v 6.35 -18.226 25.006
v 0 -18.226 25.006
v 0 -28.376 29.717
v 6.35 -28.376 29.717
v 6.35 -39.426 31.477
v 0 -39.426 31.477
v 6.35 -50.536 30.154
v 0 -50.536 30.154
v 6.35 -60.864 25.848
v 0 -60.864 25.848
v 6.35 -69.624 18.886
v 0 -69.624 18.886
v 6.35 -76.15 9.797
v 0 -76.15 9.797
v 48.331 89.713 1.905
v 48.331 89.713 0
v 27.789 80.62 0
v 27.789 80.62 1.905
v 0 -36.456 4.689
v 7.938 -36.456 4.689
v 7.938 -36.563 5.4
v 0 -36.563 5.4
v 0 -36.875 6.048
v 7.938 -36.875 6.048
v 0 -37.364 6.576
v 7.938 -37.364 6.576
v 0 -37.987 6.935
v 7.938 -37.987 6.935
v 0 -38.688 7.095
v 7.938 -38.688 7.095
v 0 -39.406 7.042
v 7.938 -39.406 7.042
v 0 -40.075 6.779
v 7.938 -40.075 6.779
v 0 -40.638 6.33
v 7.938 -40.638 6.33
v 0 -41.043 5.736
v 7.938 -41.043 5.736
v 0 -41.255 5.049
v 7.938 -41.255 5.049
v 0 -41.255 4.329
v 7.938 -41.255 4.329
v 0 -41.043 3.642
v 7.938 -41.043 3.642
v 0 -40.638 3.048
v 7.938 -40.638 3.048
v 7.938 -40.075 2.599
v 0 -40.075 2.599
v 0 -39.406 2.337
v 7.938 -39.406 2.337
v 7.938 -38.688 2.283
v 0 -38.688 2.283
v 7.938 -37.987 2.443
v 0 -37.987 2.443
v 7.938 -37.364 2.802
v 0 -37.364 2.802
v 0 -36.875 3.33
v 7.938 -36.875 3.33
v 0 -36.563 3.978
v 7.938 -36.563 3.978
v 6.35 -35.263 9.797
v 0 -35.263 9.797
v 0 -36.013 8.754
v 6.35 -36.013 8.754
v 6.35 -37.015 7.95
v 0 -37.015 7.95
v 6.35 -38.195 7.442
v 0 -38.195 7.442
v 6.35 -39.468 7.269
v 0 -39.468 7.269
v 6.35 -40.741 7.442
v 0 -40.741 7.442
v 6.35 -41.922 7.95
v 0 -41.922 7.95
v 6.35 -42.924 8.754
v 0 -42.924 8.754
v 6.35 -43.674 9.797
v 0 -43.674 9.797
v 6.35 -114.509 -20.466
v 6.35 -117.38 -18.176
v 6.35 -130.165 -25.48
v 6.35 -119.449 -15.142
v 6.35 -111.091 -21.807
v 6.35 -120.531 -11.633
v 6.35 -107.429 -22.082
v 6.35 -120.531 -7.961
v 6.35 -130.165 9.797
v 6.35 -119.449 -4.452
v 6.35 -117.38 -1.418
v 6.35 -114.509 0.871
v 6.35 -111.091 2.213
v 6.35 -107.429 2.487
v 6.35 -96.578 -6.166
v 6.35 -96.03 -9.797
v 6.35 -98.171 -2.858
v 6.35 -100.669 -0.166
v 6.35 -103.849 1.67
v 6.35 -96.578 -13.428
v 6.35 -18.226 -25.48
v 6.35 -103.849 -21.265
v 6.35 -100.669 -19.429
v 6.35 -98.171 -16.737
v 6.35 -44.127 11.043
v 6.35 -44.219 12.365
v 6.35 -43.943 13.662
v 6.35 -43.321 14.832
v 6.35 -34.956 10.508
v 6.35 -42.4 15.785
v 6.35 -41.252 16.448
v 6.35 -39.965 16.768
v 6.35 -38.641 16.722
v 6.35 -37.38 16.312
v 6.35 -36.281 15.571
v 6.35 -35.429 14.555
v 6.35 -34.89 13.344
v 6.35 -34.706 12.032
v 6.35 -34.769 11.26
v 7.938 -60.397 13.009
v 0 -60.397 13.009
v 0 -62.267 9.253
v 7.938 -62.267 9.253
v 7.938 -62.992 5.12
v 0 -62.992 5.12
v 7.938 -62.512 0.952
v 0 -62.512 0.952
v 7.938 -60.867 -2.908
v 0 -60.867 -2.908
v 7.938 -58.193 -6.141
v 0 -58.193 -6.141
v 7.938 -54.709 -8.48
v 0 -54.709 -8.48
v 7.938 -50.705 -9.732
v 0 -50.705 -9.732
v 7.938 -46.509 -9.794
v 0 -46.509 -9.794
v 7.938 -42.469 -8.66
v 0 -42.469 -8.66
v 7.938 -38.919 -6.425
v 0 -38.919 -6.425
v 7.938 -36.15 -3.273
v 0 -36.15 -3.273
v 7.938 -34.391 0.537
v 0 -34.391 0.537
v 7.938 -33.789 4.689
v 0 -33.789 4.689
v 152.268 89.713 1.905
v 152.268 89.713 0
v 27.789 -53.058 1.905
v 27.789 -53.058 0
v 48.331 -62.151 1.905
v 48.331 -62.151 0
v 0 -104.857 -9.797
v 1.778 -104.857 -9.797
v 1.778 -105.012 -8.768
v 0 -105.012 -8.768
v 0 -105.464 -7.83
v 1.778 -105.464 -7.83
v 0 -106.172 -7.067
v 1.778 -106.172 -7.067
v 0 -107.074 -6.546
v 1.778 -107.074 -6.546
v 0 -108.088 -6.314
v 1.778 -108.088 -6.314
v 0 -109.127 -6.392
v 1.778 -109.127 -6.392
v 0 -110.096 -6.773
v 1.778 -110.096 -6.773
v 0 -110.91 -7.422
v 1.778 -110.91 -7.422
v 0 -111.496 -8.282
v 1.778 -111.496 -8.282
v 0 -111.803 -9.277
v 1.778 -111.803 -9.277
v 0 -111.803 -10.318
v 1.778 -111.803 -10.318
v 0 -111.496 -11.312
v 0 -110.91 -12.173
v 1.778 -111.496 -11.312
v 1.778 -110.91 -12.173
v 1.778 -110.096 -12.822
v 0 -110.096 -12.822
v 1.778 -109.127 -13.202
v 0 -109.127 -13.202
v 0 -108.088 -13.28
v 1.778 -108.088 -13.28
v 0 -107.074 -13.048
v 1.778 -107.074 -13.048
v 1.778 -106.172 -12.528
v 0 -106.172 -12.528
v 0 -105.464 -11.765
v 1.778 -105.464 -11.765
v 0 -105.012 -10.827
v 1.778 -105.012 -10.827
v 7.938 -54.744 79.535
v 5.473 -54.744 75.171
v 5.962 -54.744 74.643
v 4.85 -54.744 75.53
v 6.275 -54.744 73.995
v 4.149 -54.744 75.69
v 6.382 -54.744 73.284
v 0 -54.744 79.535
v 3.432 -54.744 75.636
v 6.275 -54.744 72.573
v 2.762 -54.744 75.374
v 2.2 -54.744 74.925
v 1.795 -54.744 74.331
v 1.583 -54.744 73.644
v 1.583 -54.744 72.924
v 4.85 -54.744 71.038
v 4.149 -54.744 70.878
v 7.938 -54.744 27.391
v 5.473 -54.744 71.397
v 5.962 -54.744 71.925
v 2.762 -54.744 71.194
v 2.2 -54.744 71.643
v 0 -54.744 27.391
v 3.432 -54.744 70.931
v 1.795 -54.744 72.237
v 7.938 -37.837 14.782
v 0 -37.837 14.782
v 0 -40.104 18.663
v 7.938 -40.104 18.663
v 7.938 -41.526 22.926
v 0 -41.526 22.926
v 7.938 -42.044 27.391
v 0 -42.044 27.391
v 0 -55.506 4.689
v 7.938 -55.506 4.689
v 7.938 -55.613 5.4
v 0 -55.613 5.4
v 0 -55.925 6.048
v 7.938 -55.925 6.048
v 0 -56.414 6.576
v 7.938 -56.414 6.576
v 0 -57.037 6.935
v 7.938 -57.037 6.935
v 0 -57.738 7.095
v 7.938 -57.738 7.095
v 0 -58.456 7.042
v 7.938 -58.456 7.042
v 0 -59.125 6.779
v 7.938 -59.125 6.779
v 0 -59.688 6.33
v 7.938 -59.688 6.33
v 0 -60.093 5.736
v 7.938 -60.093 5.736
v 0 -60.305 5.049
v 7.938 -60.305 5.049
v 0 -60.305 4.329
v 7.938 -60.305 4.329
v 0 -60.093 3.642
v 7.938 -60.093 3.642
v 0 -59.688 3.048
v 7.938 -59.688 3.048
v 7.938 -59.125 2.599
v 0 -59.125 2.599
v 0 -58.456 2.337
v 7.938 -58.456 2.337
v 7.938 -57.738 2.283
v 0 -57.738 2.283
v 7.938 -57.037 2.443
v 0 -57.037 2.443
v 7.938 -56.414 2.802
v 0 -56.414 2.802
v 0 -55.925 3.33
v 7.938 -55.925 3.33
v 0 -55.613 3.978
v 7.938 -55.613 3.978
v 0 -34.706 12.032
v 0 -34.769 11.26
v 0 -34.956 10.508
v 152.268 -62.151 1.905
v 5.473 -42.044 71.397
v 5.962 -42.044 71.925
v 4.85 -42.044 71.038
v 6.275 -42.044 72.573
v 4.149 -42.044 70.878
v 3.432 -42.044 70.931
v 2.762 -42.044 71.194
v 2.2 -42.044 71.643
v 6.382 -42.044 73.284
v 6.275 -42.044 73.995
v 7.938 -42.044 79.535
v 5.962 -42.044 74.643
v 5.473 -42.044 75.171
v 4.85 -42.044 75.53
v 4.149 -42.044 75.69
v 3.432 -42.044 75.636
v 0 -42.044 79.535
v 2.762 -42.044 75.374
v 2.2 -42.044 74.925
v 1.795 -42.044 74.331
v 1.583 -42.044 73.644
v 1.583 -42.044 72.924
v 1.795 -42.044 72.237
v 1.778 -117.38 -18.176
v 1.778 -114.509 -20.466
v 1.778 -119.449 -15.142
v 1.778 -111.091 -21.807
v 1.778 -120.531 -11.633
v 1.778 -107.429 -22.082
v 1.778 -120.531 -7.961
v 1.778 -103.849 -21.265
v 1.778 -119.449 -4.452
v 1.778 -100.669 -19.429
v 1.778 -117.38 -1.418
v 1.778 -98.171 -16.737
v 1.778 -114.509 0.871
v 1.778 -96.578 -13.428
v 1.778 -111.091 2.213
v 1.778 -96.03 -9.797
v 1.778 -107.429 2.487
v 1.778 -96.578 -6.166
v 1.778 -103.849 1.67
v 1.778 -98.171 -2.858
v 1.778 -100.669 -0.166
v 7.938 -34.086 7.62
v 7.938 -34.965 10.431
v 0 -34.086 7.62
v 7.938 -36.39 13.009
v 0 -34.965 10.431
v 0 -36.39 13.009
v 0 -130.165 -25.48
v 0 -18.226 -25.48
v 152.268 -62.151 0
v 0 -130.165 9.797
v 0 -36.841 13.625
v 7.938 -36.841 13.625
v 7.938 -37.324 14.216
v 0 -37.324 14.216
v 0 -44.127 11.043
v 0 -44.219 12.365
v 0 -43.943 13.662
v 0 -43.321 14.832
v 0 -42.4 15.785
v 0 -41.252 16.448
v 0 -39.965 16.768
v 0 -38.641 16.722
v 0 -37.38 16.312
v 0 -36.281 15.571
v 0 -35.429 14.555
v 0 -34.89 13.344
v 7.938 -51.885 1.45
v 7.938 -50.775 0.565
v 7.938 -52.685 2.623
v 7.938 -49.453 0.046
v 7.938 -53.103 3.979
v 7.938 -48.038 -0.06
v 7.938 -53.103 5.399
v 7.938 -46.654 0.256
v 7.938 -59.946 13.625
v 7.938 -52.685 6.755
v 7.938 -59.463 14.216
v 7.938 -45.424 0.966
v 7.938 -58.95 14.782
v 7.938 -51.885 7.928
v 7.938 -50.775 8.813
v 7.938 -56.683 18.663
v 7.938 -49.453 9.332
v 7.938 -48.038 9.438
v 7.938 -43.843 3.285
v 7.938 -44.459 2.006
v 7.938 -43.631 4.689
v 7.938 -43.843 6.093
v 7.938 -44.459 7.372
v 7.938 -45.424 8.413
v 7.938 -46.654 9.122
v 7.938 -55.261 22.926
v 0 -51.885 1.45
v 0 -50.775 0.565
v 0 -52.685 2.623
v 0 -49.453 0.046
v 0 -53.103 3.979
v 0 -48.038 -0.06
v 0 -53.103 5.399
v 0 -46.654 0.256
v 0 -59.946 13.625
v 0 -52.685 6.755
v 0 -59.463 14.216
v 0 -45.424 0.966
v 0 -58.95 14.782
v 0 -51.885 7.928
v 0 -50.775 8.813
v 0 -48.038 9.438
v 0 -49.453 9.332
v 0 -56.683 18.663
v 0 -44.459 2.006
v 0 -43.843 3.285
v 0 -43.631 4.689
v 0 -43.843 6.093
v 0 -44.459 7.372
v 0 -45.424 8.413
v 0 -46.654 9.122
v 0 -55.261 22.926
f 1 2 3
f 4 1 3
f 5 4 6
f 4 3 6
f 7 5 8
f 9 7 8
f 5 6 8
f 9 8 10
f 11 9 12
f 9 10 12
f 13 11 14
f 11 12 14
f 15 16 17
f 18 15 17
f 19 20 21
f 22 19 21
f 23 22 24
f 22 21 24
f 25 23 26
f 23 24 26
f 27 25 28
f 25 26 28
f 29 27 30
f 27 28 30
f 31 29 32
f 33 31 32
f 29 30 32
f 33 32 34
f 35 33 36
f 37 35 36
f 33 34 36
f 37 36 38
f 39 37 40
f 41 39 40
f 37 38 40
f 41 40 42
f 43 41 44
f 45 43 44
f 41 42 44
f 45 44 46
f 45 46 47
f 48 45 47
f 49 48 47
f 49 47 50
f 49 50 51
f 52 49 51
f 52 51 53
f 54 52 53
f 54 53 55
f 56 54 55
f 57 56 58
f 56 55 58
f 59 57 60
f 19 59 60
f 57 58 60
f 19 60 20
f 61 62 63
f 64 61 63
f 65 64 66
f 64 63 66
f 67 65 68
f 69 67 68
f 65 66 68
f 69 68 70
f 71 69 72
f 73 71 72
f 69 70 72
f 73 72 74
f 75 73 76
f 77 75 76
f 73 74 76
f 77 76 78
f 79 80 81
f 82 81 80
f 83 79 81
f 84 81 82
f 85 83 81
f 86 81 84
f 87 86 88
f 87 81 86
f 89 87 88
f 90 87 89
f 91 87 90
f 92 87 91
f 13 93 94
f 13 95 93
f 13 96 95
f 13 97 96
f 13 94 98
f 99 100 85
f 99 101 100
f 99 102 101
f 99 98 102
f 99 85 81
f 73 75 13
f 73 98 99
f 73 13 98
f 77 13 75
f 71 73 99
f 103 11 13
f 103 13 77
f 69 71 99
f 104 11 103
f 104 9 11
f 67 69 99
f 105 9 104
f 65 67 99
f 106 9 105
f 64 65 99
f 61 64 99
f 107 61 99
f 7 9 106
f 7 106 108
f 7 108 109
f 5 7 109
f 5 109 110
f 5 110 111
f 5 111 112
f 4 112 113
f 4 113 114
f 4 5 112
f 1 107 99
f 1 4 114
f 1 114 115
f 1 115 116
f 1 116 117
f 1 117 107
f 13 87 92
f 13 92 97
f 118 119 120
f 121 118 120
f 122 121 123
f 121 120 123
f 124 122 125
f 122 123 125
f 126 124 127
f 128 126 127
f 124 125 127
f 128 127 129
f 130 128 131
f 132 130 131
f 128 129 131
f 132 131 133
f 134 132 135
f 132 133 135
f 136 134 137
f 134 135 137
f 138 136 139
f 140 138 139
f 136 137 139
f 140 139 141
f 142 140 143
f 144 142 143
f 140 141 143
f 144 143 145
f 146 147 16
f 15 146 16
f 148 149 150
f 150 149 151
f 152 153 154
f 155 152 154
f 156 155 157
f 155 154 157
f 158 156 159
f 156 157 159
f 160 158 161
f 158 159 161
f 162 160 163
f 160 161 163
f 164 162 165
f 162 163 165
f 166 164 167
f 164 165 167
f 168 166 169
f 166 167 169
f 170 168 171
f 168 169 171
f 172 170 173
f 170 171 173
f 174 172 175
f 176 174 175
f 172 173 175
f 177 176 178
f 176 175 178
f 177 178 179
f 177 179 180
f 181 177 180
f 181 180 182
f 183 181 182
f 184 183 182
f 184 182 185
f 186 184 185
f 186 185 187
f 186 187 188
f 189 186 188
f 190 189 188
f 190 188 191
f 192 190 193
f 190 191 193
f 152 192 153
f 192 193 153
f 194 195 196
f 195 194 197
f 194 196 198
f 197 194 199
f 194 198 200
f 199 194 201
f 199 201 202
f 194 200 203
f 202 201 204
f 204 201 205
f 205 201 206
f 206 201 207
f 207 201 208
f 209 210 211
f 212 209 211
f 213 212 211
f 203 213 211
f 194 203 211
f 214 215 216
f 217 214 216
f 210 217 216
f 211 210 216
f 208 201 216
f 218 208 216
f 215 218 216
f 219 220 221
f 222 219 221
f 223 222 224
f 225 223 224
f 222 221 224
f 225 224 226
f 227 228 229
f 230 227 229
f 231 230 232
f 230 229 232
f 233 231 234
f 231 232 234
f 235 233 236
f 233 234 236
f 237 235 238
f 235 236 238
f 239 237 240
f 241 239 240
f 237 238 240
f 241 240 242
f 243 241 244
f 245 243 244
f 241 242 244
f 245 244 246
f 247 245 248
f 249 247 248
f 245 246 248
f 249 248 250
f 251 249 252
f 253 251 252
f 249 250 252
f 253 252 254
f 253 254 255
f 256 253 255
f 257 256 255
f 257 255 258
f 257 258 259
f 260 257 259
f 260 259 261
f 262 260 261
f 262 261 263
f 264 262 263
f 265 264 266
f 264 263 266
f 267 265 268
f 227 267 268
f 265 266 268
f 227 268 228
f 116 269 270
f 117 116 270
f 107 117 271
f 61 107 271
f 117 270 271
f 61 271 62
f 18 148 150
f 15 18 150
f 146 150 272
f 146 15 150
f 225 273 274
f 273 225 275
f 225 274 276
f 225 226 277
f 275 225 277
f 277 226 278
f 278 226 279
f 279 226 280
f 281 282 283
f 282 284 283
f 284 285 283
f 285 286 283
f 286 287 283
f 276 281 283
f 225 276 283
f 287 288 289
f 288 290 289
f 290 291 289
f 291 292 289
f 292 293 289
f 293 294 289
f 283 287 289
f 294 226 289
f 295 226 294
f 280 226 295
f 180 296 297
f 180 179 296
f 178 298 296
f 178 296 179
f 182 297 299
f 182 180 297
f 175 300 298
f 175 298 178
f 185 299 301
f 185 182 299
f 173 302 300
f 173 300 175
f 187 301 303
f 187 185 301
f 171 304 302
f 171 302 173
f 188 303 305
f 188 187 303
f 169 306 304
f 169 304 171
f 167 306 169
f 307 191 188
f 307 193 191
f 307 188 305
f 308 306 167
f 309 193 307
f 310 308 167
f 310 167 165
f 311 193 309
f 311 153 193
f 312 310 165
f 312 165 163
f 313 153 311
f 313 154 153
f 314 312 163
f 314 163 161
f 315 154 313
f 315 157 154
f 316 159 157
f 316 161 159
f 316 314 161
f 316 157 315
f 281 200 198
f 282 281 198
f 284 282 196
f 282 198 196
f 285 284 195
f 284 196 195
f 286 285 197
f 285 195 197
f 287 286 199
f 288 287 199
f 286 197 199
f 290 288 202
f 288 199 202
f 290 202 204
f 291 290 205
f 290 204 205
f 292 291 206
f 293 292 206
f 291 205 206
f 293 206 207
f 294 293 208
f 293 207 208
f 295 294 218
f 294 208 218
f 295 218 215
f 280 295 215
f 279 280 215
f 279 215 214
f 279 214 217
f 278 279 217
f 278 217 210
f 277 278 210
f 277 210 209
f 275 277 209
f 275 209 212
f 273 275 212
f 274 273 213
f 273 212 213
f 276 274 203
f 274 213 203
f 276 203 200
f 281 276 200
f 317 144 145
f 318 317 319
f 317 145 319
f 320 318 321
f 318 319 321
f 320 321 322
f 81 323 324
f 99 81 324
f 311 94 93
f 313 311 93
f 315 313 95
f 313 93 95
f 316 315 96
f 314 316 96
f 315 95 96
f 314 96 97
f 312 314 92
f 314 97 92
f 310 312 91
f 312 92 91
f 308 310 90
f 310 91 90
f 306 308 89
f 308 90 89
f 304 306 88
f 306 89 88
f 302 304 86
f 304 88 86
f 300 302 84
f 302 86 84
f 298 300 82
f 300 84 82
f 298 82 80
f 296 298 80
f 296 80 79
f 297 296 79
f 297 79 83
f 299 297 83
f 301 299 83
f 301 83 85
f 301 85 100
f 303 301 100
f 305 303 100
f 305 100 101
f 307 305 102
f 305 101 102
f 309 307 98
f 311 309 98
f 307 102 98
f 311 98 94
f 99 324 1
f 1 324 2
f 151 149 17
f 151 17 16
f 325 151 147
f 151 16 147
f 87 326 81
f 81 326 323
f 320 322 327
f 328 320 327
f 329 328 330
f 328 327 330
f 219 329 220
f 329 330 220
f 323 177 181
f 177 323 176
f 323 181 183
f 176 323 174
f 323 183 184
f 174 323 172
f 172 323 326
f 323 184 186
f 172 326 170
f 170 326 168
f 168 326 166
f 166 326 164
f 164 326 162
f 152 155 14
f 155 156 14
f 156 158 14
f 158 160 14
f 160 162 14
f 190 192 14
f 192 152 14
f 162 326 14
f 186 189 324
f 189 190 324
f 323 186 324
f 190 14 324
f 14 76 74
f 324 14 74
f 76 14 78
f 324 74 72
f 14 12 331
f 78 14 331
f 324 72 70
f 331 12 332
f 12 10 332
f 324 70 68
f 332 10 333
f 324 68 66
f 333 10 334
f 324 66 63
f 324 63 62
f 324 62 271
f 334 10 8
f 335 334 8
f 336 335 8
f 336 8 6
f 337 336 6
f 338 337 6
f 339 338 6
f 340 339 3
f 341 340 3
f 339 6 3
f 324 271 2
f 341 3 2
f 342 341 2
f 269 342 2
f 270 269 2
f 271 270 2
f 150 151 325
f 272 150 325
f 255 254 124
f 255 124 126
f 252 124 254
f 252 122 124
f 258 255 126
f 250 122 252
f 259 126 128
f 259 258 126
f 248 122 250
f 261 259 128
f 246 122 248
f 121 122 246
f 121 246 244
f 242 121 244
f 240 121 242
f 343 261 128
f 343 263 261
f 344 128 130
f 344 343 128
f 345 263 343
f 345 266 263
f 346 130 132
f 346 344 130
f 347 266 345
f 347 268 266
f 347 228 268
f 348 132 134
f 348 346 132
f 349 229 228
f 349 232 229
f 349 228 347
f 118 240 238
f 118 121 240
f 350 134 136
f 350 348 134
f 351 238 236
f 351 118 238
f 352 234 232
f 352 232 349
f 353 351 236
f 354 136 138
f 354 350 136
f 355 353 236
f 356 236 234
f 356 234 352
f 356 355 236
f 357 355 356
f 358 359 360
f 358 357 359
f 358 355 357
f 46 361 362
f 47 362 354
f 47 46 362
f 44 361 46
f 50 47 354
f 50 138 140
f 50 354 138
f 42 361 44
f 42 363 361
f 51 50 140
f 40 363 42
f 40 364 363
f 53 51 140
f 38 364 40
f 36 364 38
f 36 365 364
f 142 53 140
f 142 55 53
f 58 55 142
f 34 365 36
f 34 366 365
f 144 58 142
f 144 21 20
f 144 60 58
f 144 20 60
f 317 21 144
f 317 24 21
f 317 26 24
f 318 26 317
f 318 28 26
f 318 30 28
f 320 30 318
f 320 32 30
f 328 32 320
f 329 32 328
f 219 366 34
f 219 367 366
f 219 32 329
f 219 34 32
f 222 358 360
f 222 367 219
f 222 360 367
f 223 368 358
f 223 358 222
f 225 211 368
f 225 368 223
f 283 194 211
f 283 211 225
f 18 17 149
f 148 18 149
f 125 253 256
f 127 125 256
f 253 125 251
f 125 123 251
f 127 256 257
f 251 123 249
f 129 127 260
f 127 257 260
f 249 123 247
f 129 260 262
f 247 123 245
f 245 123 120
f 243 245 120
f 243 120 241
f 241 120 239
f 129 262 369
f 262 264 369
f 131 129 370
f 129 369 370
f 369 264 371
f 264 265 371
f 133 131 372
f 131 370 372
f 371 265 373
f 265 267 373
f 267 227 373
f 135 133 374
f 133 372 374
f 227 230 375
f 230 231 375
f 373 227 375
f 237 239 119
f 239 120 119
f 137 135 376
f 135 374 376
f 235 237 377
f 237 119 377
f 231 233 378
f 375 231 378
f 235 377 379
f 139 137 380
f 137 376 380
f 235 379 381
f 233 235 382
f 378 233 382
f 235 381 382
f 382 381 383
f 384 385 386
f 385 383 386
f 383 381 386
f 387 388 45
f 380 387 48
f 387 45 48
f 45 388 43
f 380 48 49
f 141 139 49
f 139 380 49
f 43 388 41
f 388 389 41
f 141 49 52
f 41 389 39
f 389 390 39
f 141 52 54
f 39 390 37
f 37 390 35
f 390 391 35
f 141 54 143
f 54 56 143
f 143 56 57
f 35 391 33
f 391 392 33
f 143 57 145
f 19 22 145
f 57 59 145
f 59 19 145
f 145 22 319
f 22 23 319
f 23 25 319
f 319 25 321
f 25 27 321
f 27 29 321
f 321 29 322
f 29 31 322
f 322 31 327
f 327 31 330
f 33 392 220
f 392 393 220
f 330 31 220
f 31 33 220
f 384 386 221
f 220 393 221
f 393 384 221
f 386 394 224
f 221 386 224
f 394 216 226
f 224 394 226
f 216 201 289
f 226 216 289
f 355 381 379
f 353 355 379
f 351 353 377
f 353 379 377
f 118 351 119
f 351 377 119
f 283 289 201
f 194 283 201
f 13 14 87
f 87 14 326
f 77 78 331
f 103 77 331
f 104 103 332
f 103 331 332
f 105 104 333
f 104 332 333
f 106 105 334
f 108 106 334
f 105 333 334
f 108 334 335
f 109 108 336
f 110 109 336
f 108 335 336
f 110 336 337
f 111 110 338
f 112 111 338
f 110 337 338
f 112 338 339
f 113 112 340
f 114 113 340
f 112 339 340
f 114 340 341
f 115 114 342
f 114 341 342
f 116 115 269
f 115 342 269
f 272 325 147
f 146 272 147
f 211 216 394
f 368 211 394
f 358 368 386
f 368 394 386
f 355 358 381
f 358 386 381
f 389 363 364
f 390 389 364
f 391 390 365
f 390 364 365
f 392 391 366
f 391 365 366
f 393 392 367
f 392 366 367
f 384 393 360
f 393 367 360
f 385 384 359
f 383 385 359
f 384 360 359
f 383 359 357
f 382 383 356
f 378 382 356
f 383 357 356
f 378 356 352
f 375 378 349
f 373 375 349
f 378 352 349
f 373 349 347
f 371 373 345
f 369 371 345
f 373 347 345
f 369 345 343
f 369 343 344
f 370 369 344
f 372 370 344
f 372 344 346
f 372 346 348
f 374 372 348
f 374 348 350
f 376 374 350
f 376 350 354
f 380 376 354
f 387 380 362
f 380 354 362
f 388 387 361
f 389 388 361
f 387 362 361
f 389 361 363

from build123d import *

# Parameters (mm, degrees)
F1_DEPTH  = 7.9375
F2_R      = 2.413
F3_DEPTH  = 12.7
F4_R      = 2.413
F5_DEPTH  = 7.9375
F7_DEPTH  = 6.35
F9_DEPTH  = 1.905
F10_R     = 12.319
F11_DEPTH = 4.572
F12_R     = 3.4925
F13_DEPTH = 1.778


with BuildPart() as f1:
    # F0 (on Right) → F1 (new body)
    with BuildSketch(Plane.YZ):
        with BuildLine():
            Line((-42.043685, 27.915105), (-42.043685, 79.534633))
            Line((-42.043685, 79.534633), (-48.393685, 79.534633))
            Line((-48.393685, 79.534633), (-54.743685, 79.534633))
            Line((-54.743685, 79.534633), (-54.743685, 27.915105))
            ThreePointArc((-54.743685, 27.915105), (-54.742109, 27.653102), (-54.743685, 27.391099))
            Line((-54.743685, 27.391099), (-54.743685, 17.841362))
            ThreePointArc((-54.743685, 17.841362), (-48.393685, 19.294042), (-42.043685, 17.841362))
            Line((-42.043685, 17.841362), (-42.043685, 27.391099))
            ThreePointArc((-42.043685, 27.391099), (-42.04526, 27.653102), (-42.043685, 27.915105))
        make_face()
        with BuildLine():
            Line((-42.043685, 27.391099), (-42.043685, 27.915105))
            ThreePointArc((-42.043685, 27.915105), (-42.04526, 27.653102), (-42.043685, 27.391099))
        make_face()
        with BuildLine():
            ThreePointArc((-37.837233, 14.781978), (-40.925467, 20.757936), (-42.043685, 27.391099))
            Line((-42.043685, 27.391099), (-42.043685, 17.841362))
            ThreePointArc((-42.043685, 17.841362), (-39.803168, 16.500436), (-37.837233, 14.781978))
        make_face()
        with BuildLine():
            ThreePointArc((-54.743685, 27.391099), (-54.742109, 27.653102), (-54.743685, 27.915105))
            Line((-54.743685, 27.915105), (-54.743685, 27.391099))
        make_face()
        with BuildLine():
            ThreePointArc((-37.837233, 14.781978), (-39.803168, 16.500436), (-42.043685, 17.841362))
            Line((-42.043685, 17.841362), (-42.043685, 9.684633))
            Line((-42.043685, 9.684633), (-54.743685, 9.684633))
            Line((-54.743685, 9.684633), (-54.743685, 17.841362))
            ThreePointArc((-54.743685, 17.841362), (-56.984202, 16.500436), (-58.950136, 14.781978))
            ThreePointArc((-58.950136, 14.781978), (-59.650476, 13.87631), (-60.39742, 13.008679))
            ThreePointArc((-60.39742, 13.008679), (-52.752095, -9.250481), (-33.788685, 4.689042))
            ThreePointArc((-33.788685, 4.689042), (-34.454162, 9.047452), (-36.38995, 13.008679))
            ThreePointArc((-36.38995, 13.008679), (-37.136894, 13.87631), (-37.837233, 14.781978))
        make_face()
        with BuildLine():
            ThreePointArc((-36.38995, 13.008679), (-37.078798, 13.923725), (-37.837233, 14.781978))
            ThreePointArc((-37.837233, 14.781978), (-37.136894, 13.87631), (-36.38995, 13.008679))
        make_face()
        with BuildLine():
            Line((-54.743685, 17.841362), (-54.743685, 27.391099))
            ThreePointArc((-54.743685, 27.391099), (-55.861902, 20.757936), (-58.950136, 14.781978))
            ThreePointArc((-58.950136, 14.781978), (-56.984202, 16.500436), (-54.743685, 17.841362))
        make_face()
        with BuildLine():
            ThreePointArc((-60.39742, 13.008679), (-59.650476, 13.87631), (-58.950136, 14.781978))
            ThreePointArc((-58.950136, 14.781978), (-59.708571, 13.923725), (-60.39742, 13.008679))
        make_face()
        with BuildLine():
            Line((-42.043685, 9.684633), (-42.043685, 17.841362))
            ThreePointArc((-42.043685, 17.841362), (-48.393685, 19.294042), (-54.743685, 17.841362))
            Line((-54.743685, 17.841362), (-54.743685, 9.684633))
            Line((-54.743685, 9.684633), (-42.043685, 9.684633))
        make_face()
    extrude(amount=F1_DEPTH)

    # F2 (on face) → F3 (cut, through all)
    with BuildSketch(Plane.XZ.offset(54.743685)):
        with Locations((3.96875, 73.283965)):
            Circle(F2_R)
    extrude(amount=-F3_DEPTH, mode=Mode.SUBTRACT)

    # F4 (on face) → F5 (cut, through all)
    with BuildSketch(Plane.YZ.offset(7.9375)):
        with BuildLine():
            ThreePointArc((-53.156185, 4.689042), (-48.393685, -0.073458), (-43.631185, 4.689042))
            ThreePointArc((-43.631185, 4.689042), (-48.393685, 9.451542), (-53.156185, 4.689042))
        make_face()
        with Locations((-57.918685, 4.689042)):
            Circle(F4_R)
        with Locations((-38.868685, 4.689042)):
            Circle(F4_R)
    extrude(amount=-F5_DEPTH, mode=Mode.SUBTRACT)


with BuildPart() as f7:
    # F6 (on Right) → F7 (new body)
    with BuildSketch(Plane.YZ):
        with BuildLine():
            Line((-130.1651, 9.797143), (-130.1651, -25.480296))
            Line((-130.1651, -25.480296), (-18.226277, -25.480296))
            Line((-18.226277, -25.480296), (-18.226277, 9.797143))
            Line((-18.226277, 9.797143), (-35.262521, 9.797143))
            ThreePointArc((-35.262521, 9.797143), (-39.468314, 7.269079), (-43.674108, 9.797143))
            Line((-43.674108, 9.797143), (-76.149739, 9.797143))
            Line((-76.149739, 9.797143), (-130.1651, 9.797143))
        make_face()
        with BuildLine():
            Line((-35.262521, 9.797143), (-18.226277, 9.797143))
            Line((-18.226277, 9.797143), (-18.226277, 25.00623))
            ThreePointArc((-18.226277, 25.00623), (-50.536408, 30.153991), (-76.149739, 9.797143))
            Line((-76.149739, 9.797143), (-43.674108, 9.797143))
            ThreePointArc((-43.674108, 9.797143), (-40.619686, 16.652807), (-34.705814, 12.031579))
            ThreePointArc((-34.705814, 12.031579), (-34.847086, 10.880208), (-35.262521, 9.797143))
        make_face()
    extrude(amount=F7_DEPTH)

    # F10 (on face) → F11 (cut)
    with BuildSketch(Plane.YZ.offset(6.35)):
        with Locations((-108.349487, -9.797143)):
            Circle(F10_R)
    extrude(amount=-F11_DEPTH, mode=Mode.SUBTRACT)

    # F12 (on face) → F13 (cut, through all)
    with BuildSketch(Plane.YZ.offset(1.778)):
        with Locations((-108.349487, -9.797143)):
            Circle(F12_R)
    extrude(amount=-F13_DEPTH, mode=Mode.SUBTRACT)


with BuildPart() as f9:
    # F8 (on Top) → F9 (new body)
    with BuildSketch(Plane.XY):
        Polygon((48.331061, -62.151473), (152.26819, -62.151473), (152.26819, 89.713275), (48.331061, 89.713275), (27.789352, 80.619893), (27.789352, -53.058092), align=None)
    extrude(amount=F9_DEPTH)


solid = Compound([f1.part, f7.part, f9.part])
